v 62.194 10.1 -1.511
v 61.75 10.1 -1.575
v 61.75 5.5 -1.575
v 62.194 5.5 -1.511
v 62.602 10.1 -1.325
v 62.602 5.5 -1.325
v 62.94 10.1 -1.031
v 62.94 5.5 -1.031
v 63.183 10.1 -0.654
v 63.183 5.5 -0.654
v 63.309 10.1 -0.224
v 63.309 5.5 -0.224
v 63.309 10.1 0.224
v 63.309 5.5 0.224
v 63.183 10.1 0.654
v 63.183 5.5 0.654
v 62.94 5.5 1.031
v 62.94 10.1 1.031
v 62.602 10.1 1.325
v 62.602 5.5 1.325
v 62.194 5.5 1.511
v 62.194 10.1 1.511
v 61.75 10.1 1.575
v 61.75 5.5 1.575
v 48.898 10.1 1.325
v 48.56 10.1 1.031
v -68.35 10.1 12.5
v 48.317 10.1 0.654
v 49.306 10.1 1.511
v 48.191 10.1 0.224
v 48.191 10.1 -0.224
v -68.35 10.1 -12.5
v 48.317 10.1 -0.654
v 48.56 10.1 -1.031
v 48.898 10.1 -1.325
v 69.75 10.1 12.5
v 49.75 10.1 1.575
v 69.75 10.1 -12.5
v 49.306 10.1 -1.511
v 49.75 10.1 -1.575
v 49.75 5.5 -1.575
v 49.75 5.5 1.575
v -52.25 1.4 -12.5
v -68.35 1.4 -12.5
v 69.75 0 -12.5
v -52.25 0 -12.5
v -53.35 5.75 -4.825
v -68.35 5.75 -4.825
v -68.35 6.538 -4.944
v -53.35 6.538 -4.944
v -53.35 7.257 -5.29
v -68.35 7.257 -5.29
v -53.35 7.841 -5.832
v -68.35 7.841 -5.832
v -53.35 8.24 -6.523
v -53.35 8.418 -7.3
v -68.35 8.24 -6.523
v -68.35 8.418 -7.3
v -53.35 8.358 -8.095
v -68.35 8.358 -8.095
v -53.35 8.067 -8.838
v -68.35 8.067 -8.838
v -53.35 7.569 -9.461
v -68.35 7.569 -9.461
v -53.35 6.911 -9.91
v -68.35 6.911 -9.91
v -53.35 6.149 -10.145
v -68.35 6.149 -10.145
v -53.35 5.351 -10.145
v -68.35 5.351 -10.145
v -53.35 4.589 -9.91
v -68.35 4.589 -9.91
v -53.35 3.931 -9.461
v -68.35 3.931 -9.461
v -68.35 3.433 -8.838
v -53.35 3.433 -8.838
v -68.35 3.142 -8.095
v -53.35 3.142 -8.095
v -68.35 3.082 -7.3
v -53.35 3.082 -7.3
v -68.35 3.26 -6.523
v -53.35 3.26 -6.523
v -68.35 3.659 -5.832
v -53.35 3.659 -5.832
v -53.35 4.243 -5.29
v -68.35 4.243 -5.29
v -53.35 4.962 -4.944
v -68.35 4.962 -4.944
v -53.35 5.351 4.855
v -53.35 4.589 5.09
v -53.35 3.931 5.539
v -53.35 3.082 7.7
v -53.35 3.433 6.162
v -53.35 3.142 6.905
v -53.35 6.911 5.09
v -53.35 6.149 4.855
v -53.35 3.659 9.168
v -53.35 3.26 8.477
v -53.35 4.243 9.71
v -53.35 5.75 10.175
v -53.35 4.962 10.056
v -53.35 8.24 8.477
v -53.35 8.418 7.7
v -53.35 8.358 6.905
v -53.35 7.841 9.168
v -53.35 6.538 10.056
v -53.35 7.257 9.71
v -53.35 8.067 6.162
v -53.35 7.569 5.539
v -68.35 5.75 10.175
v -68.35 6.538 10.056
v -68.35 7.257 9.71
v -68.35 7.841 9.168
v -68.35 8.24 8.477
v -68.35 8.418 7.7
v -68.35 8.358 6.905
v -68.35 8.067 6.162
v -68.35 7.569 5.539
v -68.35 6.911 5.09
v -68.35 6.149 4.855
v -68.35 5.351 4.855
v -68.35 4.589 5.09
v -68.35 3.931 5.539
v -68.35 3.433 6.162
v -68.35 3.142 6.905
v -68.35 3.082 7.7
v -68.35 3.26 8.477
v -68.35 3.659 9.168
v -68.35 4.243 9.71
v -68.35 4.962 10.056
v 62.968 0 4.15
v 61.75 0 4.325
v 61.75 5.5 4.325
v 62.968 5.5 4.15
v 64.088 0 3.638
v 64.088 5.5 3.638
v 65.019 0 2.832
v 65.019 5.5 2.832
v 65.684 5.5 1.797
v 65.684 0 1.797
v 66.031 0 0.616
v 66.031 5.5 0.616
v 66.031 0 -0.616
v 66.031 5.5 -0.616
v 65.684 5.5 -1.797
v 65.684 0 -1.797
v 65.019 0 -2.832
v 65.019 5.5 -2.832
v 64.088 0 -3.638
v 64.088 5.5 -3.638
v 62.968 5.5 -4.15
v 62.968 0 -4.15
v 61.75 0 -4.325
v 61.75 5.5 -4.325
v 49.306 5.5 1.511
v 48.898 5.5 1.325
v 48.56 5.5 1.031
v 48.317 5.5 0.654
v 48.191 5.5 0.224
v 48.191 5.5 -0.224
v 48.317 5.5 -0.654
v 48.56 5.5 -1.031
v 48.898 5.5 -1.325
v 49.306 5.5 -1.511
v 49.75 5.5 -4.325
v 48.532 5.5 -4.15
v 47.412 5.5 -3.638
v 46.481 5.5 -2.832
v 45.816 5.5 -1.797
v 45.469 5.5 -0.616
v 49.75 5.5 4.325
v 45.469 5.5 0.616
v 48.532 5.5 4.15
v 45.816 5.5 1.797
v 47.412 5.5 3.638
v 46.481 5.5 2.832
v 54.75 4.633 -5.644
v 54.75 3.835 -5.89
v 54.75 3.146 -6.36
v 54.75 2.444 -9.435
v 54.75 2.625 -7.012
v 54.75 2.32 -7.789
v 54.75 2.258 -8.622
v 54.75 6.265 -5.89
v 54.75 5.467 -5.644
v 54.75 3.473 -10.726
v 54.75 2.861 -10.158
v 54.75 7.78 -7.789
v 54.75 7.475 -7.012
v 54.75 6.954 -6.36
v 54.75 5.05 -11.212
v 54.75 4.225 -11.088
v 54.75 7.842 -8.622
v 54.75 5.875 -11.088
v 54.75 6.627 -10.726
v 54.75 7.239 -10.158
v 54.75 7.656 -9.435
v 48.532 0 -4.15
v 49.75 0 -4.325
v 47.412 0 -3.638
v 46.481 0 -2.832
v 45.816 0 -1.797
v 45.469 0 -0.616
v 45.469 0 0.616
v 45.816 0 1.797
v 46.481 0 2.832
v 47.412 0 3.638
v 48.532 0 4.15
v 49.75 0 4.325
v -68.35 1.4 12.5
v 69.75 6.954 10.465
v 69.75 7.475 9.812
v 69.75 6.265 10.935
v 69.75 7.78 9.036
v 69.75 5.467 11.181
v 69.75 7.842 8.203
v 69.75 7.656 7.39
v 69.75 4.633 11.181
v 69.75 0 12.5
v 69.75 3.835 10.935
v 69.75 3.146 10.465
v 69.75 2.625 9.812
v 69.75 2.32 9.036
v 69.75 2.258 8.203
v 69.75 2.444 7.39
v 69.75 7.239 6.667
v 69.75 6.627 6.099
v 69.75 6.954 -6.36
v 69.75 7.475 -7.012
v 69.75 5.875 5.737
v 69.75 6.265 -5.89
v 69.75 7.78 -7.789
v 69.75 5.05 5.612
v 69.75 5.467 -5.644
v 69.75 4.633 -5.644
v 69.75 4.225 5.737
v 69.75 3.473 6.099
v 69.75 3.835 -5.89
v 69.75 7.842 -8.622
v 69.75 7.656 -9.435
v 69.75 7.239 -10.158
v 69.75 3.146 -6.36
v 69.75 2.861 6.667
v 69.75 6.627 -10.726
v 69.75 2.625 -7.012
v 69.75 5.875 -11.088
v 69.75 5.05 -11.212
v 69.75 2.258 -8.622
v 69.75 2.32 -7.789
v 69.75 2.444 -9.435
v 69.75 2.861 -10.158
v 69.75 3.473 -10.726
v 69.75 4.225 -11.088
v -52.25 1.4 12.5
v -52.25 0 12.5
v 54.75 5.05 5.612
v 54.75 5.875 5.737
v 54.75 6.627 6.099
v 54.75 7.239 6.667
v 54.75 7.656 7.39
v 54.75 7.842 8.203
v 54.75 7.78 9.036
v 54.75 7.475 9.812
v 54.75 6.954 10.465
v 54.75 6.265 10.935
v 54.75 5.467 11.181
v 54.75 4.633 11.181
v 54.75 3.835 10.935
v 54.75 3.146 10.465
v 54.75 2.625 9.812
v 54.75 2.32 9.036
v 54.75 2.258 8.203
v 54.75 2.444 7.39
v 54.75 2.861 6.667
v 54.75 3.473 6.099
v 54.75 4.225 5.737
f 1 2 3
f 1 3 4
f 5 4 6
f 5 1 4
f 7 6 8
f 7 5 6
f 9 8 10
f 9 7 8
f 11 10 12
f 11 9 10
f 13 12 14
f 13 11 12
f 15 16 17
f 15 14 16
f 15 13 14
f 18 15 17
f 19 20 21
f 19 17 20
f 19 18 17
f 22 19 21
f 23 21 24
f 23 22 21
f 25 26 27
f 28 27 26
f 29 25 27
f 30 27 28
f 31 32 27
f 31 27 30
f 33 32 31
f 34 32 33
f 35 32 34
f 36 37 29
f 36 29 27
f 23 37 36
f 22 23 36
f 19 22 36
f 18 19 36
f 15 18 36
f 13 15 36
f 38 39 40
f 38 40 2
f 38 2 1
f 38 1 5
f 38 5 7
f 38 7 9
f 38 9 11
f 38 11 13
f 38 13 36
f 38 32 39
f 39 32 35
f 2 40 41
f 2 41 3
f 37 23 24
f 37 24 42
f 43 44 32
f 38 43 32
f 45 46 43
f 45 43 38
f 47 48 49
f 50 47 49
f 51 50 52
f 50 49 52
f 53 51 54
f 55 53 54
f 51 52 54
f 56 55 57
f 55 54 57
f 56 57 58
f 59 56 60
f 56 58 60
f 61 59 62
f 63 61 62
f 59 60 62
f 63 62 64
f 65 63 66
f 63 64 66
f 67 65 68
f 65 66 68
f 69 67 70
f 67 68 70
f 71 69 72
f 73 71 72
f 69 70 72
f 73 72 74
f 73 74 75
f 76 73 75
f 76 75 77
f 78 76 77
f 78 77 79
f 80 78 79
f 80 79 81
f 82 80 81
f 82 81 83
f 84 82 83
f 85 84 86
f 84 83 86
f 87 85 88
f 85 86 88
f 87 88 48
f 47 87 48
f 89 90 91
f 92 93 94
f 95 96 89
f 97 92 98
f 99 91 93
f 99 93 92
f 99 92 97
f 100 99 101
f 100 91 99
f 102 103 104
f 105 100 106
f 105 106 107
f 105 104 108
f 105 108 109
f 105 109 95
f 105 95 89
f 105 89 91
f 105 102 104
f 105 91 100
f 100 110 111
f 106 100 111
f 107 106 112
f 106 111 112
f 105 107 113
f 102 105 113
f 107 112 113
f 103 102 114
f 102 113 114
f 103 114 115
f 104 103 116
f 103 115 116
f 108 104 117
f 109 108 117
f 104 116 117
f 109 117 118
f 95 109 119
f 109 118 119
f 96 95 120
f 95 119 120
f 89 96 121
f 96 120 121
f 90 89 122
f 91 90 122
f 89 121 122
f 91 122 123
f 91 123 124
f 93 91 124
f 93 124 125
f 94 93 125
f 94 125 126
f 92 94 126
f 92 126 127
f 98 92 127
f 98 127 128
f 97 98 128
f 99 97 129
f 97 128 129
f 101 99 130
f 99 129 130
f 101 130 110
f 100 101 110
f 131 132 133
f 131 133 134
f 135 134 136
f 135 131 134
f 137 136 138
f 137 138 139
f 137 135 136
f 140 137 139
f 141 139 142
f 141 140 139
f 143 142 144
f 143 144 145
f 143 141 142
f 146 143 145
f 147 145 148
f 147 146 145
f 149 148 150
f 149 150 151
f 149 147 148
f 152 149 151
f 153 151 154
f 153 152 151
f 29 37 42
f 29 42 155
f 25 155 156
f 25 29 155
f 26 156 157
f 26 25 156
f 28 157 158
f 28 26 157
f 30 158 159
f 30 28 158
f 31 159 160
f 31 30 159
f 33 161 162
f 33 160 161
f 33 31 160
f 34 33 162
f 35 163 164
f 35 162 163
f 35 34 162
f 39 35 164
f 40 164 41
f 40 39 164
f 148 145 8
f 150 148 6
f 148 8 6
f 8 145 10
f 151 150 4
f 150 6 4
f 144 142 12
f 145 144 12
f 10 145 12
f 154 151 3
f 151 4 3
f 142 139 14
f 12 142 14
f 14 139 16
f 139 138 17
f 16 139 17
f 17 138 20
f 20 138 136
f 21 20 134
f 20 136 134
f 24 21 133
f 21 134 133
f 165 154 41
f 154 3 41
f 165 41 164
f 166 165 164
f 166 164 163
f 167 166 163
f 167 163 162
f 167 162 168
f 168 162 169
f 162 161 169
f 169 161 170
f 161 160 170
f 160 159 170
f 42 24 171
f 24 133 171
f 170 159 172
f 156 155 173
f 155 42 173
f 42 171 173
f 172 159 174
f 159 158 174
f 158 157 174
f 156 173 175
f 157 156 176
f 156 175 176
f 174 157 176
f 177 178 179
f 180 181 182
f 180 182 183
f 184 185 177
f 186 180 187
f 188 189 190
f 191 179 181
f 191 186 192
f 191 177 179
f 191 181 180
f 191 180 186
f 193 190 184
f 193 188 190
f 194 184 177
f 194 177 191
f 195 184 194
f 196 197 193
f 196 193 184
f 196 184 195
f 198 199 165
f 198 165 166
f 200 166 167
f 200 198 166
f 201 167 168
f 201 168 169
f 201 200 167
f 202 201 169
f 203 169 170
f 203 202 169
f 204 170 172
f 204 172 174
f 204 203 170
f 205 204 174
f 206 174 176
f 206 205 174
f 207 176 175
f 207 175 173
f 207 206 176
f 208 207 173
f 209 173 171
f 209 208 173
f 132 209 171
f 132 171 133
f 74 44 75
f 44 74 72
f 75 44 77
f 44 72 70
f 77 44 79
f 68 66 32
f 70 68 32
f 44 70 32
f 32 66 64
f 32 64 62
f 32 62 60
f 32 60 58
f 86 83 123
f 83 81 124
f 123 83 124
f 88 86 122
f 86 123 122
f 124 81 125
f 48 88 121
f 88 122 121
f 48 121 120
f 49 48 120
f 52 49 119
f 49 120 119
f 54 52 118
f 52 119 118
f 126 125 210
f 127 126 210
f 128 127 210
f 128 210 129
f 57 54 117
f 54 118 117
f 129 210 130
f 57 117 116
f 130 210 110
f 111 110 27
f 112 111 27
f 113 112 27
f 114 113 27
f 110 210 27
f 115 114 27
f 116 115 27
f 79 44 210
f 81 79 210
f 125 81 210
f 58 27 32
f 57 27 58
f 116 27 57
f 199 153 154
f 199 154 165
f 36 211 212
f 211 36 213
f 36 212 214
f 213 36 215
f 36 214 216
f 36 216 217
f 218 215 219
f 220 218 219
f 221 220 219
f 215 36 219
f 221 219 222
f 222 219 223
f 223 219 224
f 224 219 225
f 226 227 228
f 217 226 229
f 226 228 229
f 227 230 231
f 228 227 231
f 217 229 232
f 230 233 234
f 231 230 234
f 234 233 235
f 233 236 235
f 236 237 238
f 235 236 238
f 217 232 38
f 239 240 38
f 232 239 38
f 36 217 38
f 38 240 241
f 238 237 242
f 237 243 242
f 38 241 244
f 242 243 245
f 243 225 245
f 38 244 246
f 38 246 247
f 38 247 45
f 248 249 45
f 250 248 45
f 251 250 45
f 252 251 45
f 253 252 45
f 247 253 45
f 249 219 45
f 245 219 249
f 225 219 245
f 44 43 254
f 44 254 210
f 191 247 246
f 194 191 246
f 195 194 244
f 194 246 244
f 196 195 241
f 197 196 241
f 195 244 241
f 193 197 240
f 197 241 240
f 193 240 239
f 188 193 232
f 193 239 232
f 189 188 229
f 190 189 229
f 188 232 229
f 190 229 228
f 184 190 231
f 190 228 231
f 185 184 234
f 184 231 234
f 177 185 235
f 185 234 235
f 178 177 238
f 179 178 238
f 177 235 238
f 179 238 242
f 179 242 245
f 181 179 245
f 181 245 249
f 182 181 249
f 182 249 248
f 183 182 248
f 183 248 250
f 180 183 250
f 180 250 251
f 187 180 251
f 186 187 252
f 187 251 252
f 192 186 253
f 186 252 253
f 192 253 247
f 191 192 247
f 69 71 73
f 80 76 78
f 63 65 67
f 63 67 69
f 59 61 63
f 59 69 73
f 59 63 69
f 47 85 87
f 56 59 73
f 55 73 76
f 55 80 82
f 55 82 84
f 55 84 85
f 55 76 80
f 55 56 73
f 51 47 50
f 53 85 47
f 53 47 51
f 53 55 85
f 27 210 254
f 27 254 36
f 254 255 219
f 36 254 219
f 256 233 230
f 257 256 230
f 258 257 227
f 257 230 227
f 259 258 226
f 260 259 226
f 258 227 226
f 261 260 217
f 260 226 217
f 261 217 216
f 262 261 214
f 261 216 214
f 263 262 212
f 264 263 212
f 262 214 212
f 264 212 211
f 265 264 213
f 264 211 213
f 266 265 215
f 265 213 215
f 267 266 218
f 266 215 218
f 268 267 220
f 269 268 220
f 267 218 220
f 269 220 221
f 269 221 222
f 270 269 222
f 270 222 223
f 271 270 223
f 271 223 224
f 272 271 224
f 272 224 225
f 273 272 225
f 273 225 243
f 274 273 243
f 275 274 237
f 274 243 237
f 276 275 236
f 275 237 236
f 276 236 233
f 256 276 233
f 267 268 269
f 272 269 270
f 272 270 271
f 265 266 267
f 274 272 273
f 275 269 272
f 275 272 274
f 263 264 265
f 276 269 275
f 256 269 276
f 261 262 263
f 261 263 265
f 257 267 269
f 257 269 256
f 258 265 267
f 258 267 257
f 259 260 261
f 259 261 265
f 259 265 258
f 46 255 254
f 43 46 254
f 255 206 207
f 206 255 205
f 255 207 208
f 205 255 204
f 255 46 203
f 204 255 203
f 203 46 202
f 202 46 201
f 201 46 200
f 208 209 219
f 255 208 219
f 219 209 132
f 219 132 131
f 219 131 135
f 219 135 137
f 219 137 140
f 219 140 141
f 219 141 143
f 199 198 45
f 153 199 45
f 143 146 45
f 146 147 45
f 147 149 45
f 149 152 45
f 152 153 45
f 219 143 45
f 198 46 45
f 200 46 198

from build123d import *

# Parameters (mm, degrees)
CROQUIS1_W              = 139.5
CROQUIS1_H              = 25
SALIENTE_EXTRUIR1_DEPTH = 10.1
CORTAR_EXTRUIR1_DEPTH   = 26
CROQUIS3_R              = 2.675
CORTAR_EXTRUIR2_DEPTH   = 15
CORTAR_EXTRUIR3_DEPTH   = 11.1
CORTAR_EXTRUIR4_DEPTH   = 5.5
CROQUIS7_R              = 2.8
CORTAR_EXTRUIR5_DEPTH   = 15


with BuildPart() as part:
    # Croquis1 → Saliente-Extruir1 (new body)
    with BuildSketch(Plane(origin=(0, 0, 0), x_dir=(1, 0, 0), z_dir=(0, 1, 0))):
        Rectangle(CROQUIS1_W, CROQUIS1_H)
    extrude(amount=SALIENTE_EXTRUIR1_DEPTH)

    # Croquis2 → Cortar-Extruir1 (cut, through all)
    with BuildSketch(Plane.XY.offset(12.5)):
        Polygon((-69.75, 10.1), (-69.75, 0), (-52.25, 0), (-52.25, 1.4), (-68.35, 1.4), (-68.35, 10.1), align=None)
    extrude(amount=-CORTAR_EXTRUIR1_DEPTH, mode=Mode.SUBTRACT)

    # Croquis3 → Cortar-Extruir2 (cut)
    with BuildSketch(Plane.ZY.offset(68.35)):
        with Locations((-7.5, 5.75)):
            Circle(CROQUIS3_R)
        with Locations((7.5, 5.75)):
            Circle(CROQUIS3_R)
    extrude(amount=-CORTAR_EXTRUIR2_DEPTH, mode=Mode.SUBTRACT)

    # Croquis4 → Cortar-Extruir3 (cut, through all)
    with BuildSketch(Plane(origin=(0, 10.1, 0), x_dir=(1, 0, 0), z_dir=(0, 1, 0))):
        with BuildLine():
            Line((49.75, 1.575), (61.75, 1.575))
            ThreePointArc((61.75, 1.575), (63.325, 0), (61.75, -1.575))
            Line((61.75, -1.575), (49.75, -1.575))
            ThreePointArc((49.75, -1.575), (48.175, 0), (49.75, 1.575))
        make_face()
    extrude(amount=-CORTAR_EXTRUIR3_DEPTH, mode=Mode.SUBTRACT)

    # Croquis5 → Cortar-Extruir4 (cut)
    with BuildSketch(Plane.XZ):
        with BuildLine():
            Line((49.75, 4.325), (61.75, 4.325))
            ThreePointArc((61.75, 4.325), (66.075, 0), (61.75, -4.325))
            Line((61.75, -4.325), (49.75, -4.325))
            ThreePointArc((49.75, -4.325), (45.425, 0), (49.75, 4.325))
        make_face()
    extrude(amount=-CORTAR_EXTRUIR4_DEPTH, mode=Mode.SUBTRACT)

    # Croquis7 → Cortar-Extruir5 (cut)
    with BuildSketch(Plane(origin=(69.75, 0, 0), x_dir=(0, 0, -1), z_dir=(1, 0, 0))):
        with Locations((-8.4125, 5.05)):
            Circle(CROQUIS7_R)
        with Locations((8.4125, 5.05)):
            Circle(CROQUIS7_R)
    extrude(amount=-CORTAR_EXTRUIR5_DEPTH, mode=Mode.SUBTRACT)


solid = part.part
